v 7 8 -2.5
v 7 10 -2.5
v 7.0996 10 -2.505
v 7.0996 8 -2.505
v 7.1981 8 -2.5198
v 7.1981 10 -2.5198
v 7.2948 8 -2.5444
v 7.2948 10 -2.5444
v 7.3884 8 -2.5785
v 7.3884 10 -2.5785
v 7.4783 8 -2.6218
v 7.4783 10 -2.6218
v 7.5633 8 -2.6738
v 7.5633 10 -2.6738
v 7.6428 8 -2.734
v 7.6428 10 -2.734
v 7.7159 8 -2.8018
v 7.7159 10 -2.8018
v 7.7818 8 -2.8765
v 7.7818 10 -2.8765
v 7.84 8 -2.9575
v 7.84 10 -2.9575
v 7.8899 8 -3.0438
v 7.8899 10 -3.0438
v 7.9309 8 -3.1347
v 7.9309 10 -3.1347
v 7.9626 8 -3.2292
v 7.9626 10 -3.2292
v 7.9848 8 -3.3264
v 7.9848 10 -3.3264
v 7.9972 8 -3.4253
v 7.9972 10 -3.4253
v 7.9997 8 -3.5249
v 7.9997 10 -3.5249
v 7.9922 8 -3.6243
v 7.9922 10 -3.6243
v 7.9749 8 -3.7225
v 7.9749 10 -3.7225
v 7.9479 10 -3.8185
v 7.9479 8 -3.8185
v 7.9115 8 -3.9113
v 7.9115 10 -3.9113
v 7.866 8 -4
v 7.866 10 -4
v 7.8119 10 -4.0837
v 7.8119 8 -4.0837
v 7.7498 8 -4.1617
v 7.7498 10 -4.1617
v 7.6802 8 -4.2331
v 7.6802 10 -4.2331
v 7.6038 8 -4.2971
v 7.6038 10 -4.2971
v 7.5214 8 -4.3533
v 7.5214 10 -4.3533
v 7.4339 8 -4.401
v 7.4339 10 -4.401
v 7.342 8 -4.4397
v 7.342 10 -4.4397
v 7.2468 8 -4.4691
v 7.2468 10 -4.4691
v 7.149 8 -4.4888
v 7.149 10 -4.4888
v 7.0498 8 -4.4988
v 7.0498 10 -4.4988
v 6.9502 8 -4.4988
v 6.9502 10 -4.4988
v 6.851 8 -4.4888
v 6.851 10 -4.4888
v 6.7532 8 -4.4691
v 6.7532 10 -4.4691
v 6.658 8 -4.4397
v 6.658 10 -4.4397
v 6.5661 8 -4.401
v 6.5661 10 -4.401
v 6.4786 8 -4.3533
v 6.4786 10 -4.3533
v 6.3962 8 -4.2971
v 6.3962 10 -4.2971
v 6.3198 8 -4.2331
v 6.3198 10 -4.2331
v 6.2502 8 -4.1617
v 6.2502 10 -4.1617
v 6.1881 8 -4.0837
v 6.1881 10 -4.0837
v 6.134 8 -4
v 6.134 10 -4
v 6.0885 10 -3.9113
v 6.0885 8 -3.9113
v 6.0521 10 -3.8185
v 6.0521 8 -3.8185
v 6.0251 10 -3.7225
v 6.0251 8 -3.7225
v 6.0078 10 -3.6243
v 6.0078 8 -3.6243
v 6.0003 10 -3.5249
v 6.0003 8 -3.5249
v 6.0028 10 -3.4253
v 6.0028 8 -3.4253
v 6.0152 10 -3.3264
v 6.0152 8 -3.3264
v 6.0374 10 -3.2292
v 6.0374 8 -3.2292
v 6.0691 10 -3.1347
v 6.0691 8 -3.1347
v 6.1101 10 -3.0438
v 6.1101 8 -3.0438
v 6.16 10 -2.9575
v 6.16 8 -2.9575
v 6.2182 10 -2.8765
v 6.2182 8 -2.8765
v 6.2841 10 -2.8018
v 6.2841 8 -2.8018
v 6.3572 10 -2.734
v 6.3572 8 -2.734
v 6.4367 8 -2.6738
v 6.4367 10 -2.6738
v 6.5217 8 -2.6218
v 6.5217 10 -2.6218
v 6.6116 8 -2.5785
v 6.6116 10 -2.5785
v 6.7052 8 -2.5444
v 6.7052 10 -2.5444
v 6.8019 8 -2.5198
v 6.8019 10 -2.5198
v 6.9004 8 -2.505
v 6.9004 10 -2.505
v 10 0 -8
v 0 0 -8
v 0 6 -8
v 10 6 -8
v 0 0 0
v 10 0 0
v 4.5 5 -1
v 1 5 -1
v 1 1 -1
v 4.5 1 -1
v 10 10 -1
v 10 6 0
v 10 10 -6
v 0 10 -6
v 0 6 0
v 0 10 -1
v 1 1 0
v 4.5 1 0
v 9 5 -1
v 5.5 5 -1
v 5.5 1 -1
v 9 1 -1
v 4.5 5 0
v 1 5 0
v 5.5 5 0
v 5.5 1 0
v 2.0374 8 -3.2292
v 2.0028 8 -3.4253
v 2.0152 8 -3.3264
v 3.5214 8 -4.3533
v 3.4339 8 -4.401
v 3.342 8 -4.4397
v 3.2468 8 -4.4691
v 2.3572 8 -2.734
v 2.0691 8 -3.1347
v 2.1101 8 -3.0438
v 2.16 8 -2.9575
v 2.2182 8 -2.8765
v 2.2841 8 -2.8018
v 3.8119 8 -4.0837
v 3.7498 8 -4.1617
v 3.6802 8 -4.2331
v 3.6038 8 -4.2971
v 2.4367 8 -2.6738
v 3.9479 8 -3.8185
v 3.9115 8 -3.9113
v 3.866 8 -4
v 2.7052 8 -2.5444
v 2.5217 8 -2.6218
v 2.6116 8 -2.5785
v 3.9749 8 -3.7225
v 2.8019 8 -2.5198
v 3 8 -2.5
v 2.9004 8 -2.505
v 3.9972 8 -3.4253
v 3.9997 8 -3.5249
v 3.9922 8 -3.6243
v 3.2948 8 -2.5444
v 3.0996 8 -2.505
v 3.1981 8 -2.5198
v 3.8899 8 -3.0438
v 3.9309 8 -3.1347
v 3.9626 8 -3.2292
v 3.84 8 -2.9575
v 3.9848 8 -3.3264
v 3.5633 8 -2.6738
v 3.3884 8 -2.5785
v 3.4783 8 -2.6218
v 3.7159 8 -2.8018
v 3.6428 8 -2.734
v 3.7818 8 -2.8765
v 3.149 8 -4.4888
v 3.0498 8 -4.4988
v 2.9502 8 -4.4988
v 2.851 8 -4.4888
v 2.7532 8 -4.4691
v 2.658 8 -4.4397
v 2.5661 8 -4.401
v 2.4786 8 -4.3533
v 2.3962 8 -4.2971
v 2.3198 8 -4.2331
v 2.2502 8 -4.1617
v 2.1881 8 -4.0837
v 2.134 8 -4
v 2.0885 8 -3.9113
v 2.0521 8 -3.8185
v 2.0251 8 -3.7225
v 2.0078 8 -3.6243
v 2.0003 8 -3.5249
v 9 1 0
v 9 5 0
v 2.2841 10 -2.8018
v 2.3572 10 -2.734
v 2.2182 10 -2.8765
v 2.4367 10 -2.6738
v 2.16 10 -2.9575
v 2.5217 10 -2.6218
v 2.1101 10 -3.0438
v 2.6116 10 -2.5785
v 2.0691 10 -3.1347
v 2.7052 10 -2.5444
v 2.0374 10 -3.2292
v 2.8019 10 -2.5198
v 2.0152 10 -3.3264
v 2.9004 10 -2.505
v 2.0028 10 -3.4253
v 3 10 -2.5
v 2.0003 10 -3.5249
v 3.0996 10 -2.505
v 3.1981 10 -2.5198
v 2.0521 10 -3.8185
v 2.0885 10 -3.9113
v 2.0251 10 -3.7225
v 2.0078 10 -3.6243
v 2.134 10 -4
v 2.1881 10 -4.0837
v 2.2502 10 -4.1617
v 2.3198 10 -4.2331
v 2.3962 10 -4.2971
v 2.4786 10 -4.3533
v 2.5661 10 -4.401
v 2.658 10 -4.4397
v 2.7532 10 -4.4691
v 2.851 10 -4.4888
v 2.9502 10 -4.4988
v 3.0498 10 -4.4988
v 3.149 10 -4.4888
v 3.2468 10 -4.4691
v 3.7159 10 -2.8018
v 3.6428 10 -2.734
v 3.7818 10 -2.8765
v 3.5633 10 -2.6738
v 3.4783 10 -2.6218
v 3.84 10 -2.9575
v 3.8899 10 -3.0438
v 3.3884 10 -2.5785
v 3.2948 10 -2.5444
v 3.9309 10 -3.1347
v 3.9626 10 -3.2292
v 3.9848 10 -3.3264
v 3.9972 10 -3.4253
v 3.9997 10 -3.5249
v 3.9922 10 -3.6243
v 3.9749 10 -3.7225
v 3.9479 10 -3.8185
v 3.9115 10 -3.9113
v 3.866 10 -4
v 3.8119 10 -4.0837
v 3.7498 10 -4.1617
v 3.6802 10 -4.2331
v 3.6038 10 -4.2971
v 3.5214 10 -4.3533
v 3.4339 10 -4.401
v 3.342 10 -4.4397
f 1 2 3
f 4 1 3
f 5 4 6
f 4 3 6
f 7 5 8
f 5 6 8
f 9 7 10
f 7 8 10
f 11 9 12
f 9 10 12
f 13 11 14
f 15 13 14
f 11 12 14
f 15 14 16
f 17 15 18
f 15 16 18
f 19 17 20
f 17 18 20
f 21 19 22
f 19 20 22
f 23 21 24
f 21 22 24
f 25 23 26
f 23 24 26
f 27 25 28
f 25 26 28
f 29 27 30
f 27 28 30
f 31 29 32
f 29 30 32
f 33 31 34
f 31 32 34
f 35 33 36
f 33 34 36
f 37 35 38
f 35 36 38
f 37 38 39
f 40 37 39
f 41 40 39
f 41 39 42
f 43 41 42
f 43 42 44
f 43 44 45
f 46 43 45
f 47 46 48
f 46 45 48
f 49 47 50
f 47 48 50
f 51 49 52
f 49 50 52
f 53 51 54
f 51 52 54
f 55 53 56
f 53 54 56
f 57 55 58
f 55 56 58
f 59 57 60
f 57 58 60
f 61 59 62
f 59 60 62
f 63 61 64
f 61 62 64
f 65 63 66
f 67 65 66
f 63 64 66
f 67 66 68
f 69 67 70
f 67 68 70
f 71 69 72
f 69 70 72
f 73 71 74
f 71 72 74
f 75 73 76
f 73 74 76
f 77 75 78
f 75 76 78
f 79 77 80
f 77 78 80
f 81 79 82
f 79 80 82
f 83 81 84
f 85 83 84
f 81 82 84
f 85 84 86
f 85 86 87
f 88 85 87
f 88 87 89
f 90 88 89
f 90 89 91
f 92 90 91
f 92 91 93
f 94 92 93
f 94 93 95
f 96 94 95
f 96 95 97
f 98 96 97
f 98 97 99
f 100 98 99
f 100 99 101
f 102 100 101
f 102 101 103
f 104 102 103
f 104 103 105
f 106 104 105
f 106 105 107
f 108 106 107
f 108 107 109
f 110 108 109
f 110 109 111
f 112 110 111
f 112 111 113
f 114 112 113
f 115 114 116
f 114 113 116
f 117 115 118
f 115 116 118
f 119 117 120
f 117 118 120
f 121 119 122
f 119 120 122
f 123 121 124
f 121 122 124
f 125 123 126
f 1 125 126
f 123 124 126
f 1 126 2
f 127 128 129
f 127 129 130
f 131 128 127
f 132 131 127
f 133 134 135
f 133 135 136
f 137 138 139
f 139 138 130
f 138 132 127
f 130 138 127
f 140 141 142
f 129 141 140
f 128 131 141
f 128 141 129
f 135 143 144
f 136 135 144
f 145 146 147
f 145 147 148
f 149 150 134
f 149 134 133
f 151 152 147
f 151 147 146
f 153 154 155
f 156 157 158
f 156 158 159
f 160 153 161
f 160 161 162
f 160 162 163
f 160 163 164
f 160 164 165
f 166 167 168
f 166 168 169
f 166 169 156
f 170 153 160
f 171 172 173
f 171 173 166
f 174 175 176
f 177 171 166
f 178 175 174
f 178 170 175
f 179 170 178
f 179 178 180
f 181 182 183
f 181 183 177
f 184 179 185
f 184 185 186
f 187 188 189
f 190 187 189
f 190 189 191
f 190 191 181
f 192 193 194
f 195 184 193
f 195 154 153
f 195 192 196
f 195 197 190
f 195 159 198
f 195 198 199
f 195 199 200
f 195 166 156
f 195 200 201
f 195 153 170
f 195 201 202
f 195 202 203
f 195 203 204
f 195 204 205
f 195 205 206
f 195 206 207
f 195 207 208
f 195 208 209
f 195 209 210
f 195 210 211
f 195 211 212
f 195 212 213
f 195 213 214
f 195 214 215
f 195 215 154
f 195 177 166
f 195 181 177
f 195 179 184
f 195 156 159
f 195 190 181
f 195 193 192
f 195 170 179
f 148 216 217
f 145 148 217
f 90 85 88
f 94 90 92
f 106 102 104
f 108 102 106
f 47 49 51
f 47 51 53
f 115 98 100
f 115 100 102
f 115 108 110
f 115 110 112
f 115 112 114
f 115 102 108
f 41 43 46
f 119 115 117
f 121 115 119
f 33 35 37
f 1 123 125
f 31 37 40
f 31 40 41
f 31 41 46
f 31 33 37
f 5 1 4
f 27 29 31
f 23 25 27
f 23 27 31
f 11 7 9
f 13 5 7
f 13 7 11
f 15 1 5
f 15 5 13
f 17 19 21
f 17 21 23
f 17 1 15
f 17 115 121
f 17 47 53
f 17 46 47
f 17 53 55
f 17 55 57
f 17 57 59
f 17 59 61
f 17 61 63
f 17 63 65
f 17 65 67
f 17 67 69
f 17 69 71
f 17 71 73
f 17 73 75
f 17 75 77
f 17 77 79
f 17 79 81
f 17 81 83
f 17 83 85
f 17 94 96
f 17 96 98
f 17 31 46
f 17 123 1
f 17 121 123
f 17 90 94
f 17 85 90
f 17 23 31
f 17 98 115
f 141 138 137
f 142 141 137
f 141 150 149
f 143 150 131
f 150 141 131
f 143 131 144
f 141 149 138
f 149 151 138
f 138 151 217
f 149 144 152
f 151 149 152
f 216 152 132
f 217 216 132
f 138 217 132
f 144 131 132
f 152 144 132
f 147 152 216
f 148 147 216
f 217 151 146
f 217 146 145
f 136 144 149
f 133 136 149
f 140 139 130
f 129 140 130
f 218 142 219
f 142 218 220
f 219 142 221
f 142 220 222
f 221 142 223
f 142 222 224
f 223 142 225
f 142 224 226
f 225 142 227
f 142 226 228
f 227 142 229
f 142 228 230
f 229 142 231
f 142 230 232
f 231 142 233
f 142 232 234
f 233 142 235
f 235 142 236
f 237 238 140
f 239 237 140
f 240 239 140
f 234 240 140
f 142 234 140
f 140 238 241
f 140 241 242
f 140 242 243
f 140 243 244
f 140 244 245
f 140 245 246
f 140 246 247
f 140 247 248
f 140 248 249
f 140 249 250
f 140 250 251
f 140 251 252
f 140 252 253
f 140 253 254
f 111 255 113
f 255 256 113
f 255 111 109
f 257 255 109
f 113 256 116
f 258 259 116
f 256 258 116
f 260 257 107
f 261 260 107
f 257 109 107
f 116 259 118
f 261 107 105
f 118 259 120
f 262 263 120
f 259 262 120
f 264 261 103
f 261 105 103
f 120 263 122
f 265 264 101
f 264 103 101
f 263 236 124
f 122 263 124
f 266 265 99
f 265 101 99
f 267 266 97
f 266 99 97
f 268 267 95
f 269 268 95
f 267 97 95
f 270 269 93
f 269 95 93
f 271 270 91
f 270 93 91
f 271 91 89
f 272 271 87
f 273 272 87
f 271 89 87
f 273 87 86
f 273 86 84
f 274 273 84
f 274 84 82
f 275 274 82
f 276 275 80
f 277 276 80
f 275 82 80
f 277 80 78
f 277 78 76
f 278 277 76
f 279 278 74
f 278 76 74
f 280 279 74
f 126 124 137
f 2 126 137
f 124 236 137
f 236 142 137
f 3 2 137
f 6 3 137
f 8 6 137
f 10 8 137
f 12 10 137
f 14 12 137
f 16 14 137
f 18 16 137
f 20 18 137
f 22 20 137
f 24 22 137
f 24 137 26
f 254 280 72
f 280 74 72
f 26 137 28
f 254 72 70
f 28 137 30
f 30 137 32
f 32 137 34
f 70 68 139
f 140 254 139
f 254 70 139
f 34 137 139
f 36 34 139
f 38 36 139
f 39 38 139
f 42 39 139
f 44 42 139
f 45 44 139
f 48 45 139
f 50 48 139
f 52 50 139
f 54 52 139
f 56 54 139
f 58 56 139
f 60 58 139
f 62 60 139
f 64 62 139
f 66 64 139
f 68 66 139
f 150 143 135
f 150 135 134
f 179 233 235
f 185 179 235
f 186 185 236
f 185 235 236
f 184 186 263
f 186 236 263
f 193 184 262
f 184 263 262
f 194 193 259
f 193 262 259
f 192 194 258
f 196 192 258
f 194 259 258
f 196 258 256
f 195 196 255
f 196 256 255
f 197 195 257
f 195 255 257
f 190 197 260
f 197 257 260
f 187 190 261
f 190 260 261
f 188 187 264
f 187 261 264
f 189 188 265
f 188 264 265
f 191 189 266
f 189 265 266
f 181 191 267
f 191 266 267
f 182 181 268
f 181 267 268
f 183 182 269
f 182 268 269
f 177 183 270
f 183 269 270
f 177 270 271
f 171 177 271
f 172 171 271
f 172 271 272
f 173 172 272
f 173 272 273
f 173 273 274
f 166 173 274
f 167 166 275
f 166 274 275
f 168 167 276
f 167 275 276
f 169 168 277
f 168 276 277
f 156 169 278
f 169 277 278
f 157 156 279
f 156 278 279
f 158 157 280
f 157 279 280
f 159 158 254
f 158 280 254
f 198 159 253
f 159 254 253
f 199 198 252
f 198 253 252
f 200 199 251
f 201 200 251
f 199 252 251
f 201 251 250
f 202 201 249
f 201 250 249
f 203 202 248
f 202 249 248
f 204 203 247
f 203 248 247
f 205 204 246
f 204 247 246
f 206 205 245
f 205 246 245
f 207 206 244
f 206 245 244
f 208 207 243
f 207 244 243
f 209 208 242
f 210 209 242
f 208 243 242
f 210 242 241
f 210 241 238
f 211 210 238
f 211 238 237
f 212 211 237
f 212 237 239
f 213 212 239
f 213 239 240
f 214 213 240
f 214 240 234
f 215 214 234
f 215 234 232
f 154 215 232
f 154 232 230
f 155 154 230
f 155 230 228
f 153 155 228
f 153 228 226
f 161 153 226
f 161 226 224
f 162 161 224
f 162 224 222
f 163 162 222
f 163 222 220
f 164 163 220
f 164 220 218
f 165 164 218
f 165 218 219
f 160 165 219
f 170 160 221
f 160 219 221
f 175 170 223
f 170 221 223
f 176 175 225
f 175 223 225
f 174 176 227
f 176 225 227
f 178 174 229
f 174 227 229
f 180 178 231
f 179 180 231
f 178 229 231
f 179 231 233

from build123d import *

# Parameters (mm, degrees)
SKETCH1_W           = 10
SKETCH1_H           = 8
BOSS_EXTRUDE1_DEPTH = 10
CUT_EXTRUDE1_DEPTH  = 10
SKETCH4_R           = 1
CUT_EXTRUDE2_DEPTH  = 2
SKETCH5_W           = 3.5
SKETCH5_H           = 4
CUT_EXTRUDE3_DEPTH  = 1


with BuildPart() as part:
    # Sketch1 → Boss-Extrude1 (new body)
    with BuildSketch(Plane(origin=(0, 0, 0), x_dir=(1, 0, 0), z_dir=(0, 1, 0))):
        with Locations((5, 4)):
            Rectangle(SKETCH1_W, SKETCH1_H)
    extrude(amount=BOSS_EXTRUDE1_DEPTH)

    # Sketch3 → Cut-Extrude1 (cut)
    with BuildSketch(Plane(origin=(10, 0, 0), x_dir=(0, 0, -1), z_dir=(1, 0, 0))):
        Polygon((0, 6), (1, 10), (6, 10), (8, 6), (9, 6), (9, 11), (-1, 11), (-1, 6), align=None)
    extrude(amount=-CUT_EXTRUDE1_DEPTH, mode=Mode.SUBTRACT)

    # Sketch4 → Cut-Extrude2 (cut)
    with BuildSketch(Plane(origin=(0, 10, 0), x_dir=(1, 0, 0), z_dir=(0, 1, 0))):
        with Locations(Location((3, 3.5, 0), (0, 0, 270))):
            Circle(SKETCH4_R)
        with Locations(Location((7, 3.5, 0), (0, 0, 270))):
            Circle(SKETCH4_R)
    extrude(amount=-CUT_EXTRUDE2_DEPTH, mode=Mode.SUBTRACT)

    # Sketch5 → Cut-Extrude3 (cut)
    with BuildSketch(Plane.XY):
        with Locations((2.75, 3)):
            Rectangle(SKETCH5_W, SKETCH5_H)
        with Locations((7.25, 3)):
            Rectangle(SKETCH5_W, SKETCH5_H)
    extrude(amount=-CUT_EXTRUDE3_DEPTH, mode=Mode.SUBTRACT)


solid = part.part
